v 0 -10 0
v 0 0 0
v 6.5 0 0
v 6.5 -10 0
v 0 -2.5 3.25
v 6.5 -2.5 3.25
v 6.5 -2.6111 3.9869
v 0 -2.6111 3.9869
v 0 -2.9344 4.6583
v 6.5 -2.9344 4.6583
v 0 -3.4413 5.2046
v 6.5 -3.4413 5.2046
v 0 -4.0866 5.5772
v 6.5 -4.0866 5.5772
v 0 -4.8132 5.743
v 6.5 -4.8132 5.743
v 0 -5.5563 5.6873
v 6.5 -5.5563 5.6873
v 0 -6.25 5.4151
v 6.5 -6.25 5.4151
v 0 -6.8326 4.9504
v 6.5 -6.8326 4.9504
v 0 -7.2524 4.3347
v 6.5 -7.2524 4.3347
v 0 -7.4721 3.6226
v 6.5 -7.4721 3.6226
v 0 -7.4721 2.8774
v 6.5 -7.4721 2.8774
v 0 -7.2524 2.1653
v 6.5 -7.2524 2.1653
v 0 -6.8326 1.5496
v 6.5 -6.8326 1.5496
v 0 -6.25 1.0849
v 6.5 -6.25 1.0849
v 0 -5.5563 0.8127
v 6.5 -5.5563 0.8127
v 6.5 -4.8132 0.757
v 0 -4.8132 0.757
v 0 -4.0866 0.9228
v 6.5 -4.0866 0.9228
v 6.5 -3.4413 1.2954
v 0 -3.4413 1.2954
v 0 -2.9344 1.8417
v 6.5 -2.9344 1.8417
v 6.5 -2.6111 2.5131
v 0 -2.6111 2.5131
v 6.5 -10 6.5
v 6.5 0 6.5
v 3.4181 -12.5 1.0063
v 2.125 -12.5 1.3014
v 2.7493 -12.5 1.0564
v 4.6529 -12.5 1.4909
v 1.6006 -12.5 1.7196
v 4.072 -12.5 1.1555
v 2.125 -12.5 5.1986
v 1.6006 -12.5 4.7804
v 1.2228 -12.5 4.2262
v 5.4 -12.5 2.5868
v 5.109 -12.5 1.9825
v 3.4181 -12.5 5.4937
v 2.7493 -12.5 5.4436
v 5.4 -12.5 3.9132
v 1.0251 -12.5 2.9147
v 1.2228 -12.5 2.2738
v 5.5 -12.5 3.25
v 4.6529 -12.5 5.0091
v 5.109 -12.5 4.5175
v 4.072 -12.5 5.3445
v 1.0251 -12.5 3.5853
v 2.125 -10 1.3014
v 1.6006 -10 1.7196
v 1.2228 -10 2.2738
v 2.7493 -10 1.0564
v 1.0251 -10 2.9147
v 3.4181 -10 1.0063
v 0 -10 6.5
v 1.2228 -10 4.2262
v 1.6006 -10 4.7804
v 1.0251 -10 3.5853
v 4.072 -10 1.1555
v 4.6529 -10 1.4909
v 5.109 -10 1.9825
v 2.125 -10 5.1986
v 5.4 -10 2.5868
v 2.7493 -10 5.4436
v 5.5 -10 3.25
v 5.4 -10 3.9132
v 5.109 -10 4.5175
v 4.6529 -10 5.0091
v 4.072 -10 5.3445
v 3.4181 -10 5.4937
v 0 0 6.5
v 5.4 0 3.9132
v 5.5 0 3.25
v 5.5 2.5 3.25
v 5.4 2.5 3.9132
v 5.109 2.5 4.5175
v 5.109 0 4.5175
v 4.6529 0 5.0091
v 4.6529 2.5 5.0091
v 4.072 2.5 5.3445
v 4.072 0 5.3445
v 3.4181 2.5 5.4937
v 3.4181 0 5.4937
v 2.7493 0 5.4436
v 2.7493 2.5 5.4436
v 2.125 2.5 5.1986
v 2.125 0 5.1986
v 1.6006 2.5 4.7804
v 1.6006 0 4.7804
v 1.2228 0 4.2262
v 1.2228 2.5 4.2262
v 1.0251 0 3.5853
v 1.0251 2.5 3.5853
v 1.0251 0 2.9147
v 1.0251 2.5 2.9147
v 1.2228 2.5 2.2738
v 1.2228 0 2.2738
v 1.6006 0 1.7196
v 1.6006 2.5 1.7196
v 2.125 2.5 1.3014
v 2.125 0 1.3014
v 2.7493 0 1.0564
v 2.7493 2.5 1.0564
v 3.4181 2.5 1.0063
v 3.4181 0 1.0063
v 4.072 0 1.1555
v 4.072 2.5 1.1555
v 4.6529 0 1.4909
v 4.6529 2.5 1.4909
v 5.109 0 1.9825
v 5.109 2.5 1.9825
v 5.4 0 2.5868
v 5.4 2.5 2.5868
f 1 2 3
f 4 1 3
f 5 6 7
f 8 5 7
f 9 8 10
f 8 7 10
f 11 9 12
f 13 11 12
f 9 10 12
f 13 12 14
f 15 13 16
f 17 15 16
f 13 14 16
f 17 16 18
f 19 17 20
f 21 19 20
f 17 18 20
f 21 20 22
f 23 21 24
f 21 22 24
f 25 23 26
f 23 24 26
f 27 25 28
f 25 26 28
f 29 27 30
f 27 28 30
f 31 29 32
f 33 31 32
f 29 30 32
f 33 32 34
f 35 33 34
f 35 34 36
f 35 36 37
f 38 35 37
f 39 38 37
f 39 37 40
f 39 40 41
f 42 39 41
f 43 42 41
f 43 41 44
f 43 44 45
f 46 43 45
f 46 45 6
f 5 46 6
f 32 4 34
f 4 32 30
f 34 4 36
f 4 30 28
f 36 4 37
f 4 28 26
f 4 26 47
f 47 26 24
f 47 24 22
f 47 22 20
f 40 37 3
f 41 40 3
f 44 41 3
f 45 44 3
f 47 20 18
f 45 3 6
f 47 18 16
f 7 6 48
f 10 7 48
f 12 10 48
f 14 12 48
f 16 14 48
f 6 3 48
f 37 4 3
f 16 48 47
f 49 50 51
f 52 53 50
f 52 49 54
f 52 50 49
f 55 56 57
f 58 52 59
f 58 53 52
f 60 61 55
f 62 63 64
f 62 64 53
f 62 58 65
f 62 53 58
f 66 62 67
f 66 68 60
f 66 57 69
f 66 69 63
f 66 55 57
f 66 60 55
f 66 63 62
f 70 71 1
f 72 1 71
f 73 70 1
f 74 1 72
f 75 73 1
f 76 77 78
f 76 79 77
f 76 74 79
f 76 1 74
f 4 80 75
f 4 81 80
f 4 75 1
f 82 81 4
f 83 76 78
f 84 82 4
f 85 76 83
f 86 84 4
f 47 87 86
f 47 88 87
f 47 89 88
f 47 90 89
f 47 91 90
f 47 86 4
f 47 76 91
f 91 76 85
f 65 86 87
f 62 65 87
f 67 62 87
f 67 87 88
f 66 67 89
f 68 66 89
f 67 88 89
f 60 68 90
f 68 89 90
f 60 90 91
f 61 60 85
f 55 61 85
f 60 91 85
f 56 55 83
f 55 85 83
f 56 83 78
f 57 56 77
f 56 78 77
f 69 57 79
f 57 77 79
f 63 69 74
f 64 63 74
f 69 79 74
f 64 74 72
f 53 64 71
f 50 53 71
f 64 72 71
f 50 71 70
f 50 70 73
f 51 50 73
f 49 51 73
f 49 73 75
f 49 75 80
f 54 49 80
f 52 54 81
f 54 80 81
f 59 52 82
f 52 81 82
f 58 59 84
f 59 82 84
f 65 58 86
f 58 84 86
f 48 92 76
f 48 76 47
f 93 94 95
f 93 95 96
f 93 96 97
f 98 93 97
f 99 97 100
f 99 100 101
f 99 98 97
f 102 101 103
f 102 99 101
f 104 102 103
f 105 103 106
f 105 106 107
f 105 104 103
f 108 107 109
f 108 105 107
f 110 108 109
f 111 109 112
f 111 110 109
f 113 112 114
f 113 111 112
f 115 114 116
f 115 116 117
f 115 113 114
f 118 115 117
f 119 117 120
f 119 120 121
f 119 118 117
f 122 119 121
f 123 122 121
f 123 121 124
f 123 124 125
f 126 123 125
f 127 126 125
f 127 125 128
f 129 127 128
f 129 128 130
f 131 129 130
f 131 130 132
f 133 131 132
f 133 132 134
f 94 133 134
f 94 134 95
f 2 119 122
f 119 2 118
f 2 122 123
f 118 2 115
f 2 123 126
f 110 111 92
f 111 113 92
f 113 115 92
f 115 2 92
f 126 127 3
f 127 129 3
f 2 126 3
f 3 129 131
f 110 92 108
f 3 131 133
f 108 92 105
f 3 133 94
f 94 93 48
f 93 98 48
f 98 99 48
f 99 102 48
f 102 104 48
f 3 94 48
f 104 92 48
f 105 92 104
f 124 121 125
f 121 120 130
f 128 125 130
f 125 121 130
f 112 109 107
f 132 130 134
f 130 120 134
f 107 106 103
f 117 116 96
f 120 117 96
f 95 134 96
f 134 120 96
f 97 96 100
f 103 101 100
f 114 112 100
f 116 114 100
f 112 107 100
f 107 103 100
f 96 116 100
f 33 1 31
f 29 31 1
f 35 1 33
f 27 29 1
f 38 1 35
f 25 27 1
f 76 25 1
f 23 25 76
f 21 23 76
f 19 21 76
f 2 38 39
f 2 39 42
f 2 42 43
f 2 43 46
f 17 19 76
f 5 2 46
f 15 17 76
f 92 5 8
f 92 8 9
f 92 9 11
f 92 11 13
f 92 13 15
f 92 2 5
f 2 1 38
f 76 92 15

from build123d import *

# Parameters (mm, degrees)
F0_W          = 6.5
F0_H          = 6.5
F1_DEPTH      = 10
F2_R          = 2.25
F3_DEPTH      = 2.5
F3_DEPTH_BACK = 12.5
F4_R          = 2.5
F5_DEPTH      = 25


with BuildPart() as f1:
    # F0 (on Front) → F1 (new body)
    with BuildSketch(Plane.XZ):
        with Locations((3.25, 3.25)):
            Rectangle(F0_W, F0_H)
    extrude(amount=F1_DEPTH)

    # F2 (on face) → F3 (join, two sides)
    with BuildSketch(Plane.XZ.offset(10)) as f3_sk:
        with Locations((3.25, 3.25)):
            Circle(F2_R)
    extrude(amount=F3_DEPTH)
    extrude(f3_sk.sketch, amount=-F3_DEPTH_BACK)

    # F4 (on face) → F5 (cut)
    with BuildSketch(Plane.YZ.offset(6.5)):
        with Locations((-5, 3.25)):
            Circle(F4_R)
    extrude(amount=-F5_DEPTH, mode=Mode.SUBTRACT)


solid = f1.part
